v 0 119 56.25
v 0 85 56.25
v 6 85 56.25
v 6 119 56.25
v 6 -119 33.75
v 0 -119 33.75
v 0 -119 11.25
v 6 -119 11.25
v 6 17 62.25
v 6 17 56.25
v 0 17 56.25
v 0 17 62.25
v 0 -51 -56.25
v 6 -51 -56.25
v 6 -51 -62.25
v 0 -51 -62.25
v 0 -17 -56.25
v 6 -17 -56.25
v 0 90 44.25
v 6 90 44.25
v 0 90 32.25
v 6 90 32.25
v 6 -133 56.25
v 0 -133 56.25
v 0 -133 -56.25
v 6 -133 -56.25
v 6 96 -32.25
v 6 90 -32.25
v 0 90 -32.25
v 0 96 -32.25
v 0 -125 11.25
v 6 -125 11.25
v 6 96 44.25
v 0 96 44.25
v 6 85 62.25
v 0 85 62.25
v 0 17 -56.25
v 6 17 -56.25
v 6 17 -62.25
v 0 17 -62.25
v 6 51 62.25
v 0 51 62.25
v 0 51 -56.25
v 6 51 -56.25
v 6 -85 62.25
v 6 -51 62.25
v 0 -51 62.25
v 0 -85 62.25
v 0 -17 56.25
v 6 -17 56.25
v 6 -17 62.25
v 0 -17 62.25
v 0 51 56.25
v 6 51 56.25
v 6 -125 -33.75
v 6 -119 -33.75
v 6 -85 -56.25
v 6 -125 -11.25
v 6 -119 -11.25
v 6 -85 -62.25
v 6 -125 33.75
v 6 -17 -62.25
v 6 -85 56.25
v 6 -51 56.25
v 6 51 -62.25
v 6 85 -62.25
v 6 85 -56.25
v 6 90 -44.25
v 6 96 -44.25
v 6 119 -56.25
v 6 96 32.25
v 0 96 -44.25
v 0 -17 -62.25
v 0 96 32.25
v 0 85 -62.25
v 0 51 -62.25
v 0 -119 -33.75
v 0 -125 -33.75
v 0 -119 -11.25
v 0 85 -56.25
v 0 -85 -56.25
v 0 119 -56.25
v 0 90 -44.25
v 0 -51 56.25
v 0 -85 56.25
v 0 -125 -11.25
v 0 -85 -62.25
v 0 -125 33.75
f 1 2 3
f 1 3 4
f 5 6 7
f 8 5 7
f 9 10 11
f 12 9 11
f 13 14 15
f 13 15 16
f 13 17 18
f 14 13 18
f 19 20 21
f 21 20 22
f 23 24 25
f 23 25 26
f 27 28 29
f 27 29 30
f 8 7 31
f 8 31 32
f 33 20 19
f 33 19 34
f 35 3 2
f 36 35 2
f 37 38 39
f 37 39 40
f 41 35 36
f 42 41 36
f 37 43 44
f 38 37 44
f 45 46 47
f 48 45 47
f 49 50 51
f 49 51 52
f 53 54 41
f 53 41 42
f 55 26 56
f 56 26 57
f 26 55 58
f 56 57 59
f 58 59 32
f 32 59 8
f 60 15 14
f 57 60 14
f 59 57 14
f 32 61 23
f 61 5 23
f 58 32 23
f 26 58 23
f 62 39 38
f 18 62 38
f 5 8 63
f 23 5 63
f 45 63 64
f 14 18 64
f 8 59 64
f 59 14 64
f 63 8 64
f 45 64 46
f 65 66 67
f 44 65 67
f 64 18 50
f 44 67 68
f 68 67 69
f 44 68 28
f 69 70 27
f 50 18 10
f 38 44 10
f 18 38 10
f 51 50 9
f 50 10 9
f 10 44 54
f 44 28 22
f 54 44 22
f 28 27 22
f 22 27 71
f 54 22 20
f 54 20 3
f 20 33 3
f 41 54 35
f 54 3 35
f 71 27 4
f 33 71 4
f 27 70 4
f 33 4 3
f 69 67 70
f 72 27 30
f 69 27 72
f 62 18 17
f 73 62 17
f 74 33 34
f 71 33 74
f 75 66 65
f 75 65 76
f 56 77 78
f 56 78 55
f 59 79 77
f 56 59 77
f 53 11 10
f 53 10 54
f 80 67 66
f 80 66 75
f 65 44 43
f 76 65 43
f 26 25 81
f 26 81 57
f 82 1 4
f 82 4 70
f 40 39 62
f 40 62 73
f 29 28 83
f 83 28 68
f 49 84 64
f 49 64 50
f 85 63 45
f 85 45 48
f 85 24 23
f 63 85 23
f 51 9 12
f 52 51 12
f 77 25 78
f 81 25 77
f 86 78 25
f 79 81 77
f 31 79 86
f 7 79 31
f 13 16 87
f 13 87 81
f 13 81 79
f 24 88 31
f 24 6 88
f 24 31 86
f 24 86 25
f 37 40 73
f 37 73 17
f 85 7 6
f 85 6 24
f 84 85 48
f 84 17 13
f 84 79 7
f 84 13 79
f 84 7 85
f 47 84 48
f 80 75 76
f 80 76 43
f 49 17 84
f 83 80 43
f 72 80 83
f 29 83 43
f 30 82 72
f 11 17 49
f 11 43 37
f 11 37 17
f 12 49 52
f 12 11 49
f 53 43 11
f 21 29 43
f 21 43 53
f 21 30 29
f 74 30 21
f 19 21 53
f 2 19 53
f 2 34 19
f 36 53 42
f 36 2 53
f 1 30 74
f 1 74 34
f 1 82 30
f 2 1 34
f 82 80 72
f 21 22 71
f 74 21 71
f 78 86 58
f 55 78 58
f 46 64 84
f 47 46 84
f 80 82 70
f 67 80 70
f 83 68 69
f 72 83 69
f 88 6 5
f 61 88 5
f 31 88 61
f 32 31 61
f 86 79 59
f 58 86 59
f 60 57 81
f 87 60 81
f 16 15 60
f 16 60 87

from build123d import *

# Parameters (mm, degrees)
SKETCH1_W           = 112.5
SKETCH1_H           = 238
BOSS_EXTRUDE1_DEPTH = 6
SKETCH4_W           = 6
SKETCH4_H           = 22.5
BOSS_EXTRUDE2_DEPTH = 6
SKETCH5_W           = 6
SKETCH5_H           = 34
BOSS_EXTRUDE3_DEPTH = 6
SKETCH6_W           = 12
SKETCH6_H           = 6
CUT_EXTRUDE1_DEPTH  = 800
SKETCH7_W           = 6
SKETCH7_H           = 112.5
BOSS_EXTRUDE4_DEPTH = 8


with BuildPart() as part:
    # Sketch1 → Boss-Extrude1 (new body)
    with BuildSketch(Plane(origin=(0, 0, 0), x_dir=(0, 0, -1), z_dir=(1, 0, 0))):
        Rectangle(SKETCH1_W, SKETCH1_H)
    extrude(amount=BOSS_EXTRUDE1_DEPTH)

    # Sketch4 → Boss-Extrude2 (add)
    with BuildSketch(Plane.XZ.offset(119)):
        with Locations((3, -45)):
            Rectangle(SKETCH4_W, SKETCH4_H)
        with Locations((3, 0)):
            Rectangle(SKETCH4_W, SKETCH4_H)
        with Locations((3, 45)):
            Rectangle(SKETCH4_W, SKETCH4_H)
    extrude(amount=BOSS_EXTRUDE2_DEPTH)

    # Sketch5 → Boss-Extrude3 (add)
    with BuildSketch(Plane(origin=(0, 0, -56.25), x_dir=(-1, 0, 0), z_dir=(0, 0, -1))):
        with Locations((-3, -68)):
            Rectangle(SKETCH5_W, SKETCH5_H)
        with Locations((-3, 0)):
            Rectangle(SKETCH5_W, SKETCH5_H)
        with Locations((-3, 68)):
            Rectangle(SKETCH5_W, SKETCH5_H)
    boss_extrude3 = extrude(amount=BOSS_EXTRUDE3_DEPTH)

    # Mirror1: Boss-Extrude3 across plane
    add(boss_extrude3.mirror(Plane.XY))

    # Sketch6 → Cut-Extrude1 (cut)
    with BuildSketch(Plane(origin=(6, 0, 0), x_dir=(0, 0, -1), z_dir=(1, 0, 0))):
        with Locations((-38.25, 93)):
            Rectangle(SKETCH6_W, SKETCH6_H)
        with Locations((38.25, 93)):
            Rectangle(SKETCH6_W, SKETCH6_H)
    extrude(amount=-CUT_EXTRUDE1_DEPTH, mode=Mode.SUBTRACT)

    # Sketch7 → Boss-Extrude4 (add)
    with BuildSketch(Plane.XZ.offset(125)):
        with Locations((3, 0)):
            Rectangle(SKETCH7_W, SKETCH7_H)
    extrude(amount=BOSS_EXTRUDE4_DEPTH)


solid = part.part
